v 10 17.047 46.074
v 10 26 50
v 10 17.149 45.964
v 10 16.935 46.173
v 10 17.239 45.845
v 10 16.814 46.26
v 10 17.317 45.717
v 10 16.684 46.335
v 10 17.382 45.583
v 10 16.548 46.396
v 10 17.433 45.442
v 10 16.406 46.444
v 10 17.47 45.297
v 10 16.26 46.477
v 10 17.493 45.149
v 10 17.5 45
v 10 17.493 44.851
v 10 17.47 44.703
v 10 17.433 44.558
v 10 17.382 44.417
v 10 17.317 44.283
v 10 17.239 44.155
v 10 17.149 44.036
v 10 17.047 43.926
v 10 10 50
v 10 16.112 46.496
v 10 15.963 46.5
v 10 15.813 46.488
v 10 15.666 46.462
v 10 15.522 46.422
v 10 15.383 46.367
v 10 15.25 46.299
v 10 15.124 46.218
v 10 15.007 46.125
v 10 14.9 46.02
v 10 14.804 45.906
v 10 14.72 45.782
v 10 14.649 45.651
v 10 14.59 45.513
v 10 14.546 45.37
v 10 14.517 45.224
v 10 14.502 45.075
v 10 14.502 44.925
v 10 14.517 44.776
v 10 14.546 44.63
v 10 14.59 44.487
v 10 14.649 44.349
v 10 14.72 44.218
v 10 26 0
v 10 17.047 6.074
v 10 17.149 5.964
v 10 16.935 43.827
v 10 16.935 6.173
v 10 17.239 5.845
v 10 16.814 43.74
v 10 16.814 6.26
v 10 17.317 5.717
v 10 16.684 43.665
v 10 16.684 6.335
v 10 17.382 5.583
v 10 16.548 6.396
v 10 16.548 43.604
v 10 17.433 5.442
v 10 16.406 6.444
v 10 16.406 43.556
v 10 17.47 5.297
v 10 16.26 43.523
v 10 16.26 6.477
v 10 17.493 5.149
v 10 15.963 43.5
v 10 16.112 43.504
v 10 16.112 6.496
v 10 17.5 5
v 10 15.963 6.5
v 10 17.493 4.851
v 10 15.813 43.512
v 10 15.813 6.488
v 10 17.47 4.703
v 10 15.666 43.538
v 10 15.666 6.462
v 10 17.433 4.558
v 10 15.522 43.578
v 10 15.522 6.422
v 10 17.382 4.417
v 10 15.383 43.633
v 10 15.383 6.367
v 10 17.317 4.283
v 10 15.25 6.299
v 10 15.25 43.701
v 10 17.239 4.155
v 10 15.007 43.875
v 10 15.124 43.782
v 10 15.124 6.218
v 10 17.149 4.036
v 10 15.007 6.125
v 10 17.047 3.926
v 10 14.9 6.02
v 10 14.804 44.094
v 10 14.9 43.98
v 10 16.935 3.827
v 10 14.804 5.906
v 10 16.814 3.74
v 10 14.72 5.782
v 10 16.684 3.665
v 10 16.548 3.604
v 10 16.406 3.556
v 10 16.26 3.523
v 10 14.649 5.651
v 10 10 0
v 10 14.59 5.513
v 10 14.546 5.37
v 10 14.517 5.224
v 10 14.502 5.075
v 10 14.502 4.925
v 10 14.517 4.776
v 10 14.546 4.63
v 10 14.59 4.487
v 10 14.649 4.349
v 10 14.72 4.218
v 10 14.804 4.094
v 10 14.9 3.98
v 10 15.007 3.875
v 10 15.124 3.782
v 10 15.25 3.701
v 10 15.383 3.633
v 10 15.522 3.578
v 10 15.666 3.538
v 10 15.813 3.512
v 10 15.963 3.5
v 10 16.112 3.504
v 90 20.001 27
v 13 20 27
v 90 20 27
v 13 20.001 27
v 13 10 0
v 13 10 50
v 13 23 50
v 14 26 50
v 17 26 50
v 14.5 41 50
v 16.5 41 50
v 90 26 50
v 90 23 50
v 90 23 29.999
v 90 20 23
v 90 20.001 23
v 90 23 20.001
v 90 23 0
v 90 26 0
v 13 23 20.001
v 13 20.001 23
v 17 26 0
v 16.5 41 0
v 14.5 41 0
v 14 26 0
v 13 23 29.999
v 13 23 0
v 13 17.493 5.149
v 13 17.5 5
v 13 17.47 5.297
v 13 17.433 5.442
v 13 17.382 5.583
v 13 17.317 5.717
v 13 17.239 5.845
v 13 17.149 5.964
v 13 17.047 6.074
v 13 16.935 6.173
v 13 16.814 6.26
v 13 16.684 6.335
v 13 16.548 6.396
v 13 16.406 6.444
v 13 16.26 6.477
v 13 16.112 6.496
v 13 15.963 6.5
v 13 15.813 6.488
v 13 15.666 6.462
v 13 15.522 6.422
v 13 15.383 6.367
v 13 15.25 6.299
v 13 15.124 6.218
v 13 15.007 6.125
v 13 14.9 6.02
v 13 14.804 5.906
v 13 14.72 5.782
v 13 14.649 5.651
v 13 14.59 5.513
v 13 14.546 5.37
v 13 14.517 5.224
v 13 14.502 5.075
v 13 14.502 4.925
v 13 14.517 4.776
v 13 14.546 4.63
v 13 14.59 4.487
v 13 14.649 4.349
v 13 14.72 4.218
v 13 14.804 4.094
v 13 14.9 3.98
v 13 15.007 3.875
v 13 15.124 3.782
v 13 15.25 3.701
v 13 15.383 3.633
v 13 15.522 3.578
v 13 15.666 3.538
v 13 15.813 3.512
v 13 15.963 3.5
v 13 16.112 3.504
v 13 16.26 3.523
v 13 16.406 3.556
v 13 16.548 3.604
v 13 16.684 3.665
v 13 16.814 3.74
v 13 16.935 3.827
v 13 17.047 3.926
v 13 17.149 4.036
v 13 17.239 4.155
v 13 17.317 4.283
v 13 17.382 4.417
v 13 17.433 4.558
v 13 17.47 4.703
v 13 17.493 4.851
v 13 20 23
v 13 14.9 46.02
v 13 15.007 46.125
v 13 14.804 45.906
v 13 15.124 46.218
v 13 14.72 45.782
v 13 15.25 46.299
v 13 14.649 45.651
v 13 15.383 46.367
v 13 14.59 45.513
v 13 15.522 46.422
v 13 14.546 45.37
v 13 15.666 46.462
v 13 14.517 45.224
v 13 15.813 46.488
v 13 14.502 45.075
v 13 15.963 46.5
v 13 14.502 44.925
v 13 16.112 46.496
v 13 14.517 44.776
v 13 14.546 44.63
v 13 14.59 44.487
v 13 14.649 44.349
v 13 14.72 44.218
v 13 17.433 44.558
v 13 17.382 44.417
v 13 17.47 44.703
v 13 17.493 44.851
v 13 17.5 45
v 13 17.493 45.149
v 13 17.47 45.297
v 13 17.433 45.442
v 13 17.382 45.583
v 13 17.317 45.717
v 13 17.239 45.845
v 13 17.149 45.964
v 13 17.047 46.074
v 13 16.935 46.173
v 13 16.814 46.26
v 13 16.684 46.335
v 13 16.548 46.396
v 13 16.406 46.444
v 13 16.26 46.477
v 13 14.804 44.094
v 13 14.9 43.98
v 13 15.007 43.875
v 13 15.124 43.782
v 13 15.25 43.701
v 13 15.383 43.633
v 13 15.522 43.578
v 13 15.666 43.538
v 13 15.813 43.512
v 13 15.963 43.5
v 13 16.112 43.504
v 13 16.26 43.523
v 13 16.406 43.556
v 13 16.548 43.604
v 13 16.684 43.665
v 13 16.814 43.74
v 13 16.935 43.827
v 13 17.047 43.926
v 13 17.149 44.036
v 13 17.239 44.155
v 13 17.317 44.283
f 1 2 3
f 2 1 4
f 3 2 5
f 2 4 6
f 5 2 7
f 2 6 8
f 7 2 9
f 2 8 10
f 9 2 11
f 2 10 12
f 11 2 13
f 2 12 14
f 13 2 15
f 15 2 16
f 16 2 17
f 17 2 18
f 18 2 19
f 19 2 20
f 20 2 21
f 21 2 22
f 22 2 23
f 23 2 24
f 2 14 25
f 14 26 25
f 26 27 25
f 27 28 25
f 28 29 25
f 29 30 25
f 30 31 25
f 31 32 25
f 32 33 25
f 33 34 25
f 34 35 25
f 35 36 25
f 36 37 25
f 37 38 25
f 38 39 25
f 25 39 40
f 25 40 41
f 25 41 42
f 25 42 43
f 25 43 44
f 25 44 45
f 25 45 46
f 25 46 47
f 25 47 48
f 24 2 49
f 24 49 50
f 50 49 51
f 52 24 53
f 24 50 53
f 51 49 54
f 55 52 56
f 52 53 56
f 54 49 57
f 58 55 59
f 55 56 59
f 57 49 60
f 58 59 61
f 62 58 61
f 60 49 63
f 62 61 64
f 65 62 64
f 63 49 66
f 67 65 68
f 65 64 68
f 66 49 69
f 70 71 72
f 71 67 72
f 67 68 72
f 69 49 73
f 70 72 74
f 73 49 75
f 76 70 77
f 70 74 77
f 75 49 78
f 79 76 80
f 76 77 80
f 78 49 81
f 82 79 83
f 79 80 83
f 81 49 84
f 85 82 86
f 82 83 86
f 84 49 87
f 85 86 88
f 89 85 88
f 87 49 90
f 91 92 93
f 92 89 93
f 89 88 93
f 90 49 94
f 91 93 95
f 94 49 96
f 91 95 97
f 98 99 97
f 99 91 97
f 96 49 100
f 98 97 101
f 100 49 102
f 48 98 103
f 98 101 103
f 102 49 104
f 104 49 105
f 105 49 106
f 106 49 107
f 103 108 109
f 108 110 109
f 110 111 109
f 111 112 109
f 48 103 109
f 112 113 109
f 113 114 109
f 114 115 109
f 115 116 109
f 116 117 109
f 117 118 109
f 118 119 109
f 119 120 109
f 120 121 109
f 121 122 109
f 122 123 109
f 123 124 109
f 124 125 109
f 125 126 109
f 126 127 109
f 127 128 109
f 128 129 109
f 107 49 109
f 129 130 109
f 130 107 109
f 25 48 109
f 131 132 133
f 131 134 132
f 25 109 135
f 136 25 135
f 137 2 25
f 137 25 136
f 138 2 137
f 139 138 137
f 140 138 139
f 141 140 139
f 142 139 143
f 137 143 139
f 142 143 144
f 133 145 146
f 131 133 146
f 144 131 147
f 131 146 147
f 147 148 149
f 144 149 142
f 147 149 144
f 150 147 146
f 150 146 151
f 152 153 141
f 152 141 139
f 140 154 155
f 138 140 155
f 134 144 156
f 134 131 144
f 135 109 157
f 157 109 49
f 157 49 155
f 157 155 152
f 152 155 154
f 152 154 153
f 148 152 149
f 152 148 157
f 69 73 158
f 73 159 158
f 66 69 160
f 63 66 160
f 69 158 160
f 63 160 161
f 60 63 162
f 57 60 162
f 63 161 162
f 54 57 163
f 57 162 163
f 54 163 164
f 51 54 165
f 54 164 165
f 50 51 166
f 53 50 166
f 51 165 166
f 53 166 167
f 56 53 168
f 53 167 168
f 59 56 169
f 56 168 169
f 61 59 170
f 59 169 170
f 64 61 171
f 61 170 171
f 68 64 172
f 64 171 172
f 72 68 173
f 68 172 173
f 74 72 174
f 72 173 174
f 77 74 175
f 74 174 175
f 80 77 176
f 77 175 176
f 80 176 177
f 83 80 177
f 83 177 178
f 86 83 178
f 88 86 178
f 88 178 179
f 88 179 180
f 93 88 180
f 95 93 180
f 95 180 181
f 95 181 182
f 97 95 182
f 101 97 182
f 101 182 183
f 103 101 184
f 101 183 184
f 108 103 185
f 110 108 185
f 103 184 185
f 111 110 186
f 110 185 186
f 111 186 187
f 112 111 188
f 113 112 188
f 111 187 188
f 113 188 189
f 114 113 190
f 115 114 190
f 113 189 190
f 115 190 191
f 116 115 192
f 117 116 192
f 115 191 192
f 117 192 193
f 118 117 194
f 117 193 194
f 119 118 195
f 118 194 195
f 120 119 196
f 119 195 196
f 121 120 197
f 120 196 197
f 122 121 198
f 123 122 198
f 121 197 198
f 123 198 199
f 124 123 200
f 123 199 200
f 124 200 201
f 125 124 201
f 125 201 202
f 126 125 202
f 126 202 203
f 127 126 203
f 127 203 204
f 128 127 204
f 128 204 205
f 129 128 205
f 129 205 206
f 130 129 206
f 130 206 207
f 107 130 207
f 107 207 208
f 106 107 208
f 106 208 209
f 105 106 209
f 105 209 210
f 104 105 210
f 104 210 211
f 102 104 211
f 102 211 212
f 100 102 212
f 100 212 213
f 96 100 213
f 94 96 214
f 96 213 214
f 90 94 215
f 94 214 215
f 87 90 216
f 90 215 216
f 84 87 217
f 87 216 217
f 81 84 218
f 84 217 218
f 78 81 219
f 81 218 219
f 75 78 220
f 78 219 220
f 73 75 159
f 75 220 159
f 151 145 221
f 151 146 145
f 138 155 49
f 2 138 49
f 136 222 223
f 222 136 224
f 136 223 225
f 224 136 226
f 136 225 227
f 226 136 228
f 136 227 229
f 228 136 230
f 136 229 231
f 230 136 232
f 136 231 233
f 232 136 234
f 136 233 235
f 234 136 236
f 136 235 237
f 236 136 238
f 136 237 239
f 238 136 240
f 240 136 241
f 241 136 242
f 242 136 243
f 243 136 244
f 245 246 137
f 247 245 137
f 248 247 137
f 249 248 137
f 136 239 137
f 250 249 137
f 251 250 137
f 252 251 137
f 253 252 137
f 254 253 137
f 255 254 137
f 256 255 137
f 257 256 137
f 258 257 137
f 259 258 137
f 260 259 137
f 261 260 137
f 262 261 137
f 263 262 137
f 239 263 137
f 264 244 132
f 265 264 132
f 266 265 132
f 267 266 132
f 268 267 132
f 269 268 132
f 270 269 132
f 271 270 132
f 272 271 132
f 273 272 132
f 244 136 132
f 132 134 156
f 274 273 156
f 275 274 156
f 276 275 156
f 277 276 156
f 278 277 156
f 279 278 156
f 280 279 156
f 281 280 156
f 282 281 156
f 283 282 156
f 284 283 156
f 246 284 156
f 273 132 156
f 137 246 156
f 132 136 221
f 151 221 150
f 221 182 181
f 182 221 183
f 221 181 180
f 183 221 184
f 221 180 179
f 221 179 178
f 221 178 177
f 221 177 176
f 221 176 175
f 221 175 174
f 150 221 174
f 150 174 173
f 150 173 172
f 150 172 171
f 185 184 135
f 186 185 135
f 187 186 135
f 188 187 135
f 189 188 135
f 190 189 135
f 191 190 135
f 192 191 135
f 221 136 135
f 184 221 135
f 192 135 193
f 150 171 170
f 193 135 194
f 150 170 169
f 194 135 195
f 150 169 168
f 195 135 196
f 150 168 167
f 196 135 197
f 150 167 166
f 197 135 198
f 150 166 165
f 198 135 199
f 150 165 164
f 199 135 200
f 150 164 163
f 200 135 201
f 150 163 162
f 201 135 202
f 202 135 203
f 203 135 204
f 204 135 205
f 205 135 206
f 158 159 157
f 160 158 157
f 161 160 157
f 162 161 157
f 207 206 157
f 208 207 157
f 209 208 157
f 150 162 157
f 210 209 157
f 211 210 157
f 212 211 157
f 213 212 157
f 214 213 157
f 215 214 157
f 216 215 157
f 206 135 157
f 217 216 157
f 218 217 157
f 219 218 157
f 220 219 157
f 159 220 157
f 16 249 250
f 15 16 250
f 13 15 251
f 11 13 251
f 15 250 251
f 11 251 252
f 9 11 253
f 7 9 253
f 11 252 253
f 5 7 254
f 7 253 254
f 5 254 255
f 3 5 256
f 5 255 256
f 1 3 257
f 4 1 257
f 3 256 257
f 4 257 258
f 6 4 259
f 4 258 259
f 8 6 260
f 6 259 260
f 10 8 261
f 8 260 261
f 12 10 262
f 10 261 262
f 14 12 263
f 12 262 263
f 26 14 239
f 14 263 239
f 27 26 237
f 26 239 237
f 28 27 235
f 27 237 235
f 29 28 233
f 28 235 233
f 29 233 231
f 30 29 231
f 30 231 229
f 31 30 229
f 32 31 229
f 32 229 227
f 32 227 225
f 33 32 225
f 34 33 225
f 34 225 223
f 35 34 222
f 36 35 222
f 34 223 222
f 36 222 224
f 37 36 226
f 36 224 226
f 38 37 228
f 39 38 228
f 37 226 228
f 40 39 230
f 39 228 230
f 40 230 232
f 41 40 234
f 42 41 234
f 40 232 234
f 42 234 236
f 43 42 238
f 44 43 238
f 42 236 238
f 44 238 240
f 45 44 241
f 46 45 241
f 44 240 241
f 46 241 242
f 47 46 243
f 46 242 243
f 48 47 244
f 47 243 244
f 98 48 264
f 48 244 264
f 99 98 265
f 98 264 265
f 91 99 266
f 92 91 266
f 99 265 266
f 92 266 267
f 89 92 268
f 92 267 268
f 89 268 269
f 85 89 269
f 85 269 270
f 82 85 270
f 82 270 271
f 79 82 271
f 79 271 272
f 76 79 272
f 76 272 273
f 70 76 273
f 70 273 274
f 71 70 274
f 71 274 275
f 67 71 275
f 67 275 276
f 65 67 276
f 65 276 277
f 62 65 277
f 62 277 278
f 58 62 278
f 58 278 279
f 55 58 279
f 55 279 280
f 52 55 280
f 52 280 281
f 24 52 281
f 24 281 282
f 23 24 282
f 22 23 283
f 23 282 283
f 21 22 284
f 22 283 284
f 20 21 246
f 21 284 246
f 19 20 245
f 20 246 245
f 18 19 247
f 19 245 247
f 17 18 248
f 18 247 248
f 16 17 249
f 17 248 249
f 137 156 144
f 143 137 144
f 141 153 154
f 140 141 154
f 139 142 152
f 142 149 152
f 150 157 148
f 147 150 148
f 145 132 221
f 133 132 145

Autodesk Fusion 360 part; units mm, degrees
sketch "Skizze1" plane through (0, 0, 0) normal (0, 0, 1) x (1, 0, 0)
  line L0 (10, 10) -> (13, 10)
  line L1 (13, 10) -> (13, 23)
  line L2 (13, 23) -> (10, 23)
  line L3 (10, 23) -> (10, 10)
  line L4 (10, 23) -> (90, 23)
  line L5 (90, 23) -> (90, 26)
  line L6 (90, 26) -> (10, 26)
  line L7 (10, 26) -> (10, 23)
  line L8 (14, 26) -> (17, 26)
  line L9 (15.5, 26) -> (15.5, 41)
  line L10 (15.5, 41) -> (16.5, 41)
  line L11 (15.5, 41) -> (14.5, 41)
  line L12 (14.5, 41) -> (14, 26)
  line L13 (16.5, 41) -> (17, 26)
  dimension "d1" = 3
  dimension "d2" = 13
  dimension "d3" = 80
  dimension "d4" = 3
  dimension "d5" = 3
  dimension "d6" = 15
  dimension "d7" = 1
  dimension "d8" = 1
extrude "Extrusion1" add sketch "Skizze1" along normal blind 50
sketch "Skizze2" plane through (13, 0, 0) normal (1, 0, 0) x (0, 1, 0)
  line L0 (10, 0) -> (23, 0)
  line L1 (23, 0) -> (23, 50)
  line L2 (23, 50) -> (10, 50)
  line L3 (10, 50) -> (10, 0)
  circle A0 centre (16, 45) radius 1.5
  circle A1 centre (16, 5) radius 1.5
  dimension "d11" = 3
  dimension "d12" = 3
extrude "Extrusion2" cut sketch "Skizze2" against normal blind 3 contours A0 | A1
sketch "Skizze3" plane through (0, 23, 0) normal (0, -1, 0) x (1, 0, 0)
  line L0 (13, 0) -> (90, 0)
  line L1 (90, 0) -> (90, 50)
  line L2 (90, 50) -> (13, 50)
  line L3 (13, 50) -> (13, 0)
  line L4 (90, 23) -> (13, 23)
  line L5 (13, 23) -> (13, 27)
  line L6 (13, 27) -> (90, 27)
  line L7 (90, 27) -> (90, 23)
  line L8 (90, 23) -> (13, 27) construction
  line L9 (13, 23) -> (90, 27) construction
  dimension "d15" = 4
extrude "Extrusion3" add sketch "Skizze3" along normal blind 3 contours L1 L3 L4 L5 L6 L7
chamfer "Fase1" distance 3 angle 45 1 edges at (51.5, 23, 27)
chamfer "Fase2" distance 3 angle 45 1 edges at (51.5, 23, 23)
